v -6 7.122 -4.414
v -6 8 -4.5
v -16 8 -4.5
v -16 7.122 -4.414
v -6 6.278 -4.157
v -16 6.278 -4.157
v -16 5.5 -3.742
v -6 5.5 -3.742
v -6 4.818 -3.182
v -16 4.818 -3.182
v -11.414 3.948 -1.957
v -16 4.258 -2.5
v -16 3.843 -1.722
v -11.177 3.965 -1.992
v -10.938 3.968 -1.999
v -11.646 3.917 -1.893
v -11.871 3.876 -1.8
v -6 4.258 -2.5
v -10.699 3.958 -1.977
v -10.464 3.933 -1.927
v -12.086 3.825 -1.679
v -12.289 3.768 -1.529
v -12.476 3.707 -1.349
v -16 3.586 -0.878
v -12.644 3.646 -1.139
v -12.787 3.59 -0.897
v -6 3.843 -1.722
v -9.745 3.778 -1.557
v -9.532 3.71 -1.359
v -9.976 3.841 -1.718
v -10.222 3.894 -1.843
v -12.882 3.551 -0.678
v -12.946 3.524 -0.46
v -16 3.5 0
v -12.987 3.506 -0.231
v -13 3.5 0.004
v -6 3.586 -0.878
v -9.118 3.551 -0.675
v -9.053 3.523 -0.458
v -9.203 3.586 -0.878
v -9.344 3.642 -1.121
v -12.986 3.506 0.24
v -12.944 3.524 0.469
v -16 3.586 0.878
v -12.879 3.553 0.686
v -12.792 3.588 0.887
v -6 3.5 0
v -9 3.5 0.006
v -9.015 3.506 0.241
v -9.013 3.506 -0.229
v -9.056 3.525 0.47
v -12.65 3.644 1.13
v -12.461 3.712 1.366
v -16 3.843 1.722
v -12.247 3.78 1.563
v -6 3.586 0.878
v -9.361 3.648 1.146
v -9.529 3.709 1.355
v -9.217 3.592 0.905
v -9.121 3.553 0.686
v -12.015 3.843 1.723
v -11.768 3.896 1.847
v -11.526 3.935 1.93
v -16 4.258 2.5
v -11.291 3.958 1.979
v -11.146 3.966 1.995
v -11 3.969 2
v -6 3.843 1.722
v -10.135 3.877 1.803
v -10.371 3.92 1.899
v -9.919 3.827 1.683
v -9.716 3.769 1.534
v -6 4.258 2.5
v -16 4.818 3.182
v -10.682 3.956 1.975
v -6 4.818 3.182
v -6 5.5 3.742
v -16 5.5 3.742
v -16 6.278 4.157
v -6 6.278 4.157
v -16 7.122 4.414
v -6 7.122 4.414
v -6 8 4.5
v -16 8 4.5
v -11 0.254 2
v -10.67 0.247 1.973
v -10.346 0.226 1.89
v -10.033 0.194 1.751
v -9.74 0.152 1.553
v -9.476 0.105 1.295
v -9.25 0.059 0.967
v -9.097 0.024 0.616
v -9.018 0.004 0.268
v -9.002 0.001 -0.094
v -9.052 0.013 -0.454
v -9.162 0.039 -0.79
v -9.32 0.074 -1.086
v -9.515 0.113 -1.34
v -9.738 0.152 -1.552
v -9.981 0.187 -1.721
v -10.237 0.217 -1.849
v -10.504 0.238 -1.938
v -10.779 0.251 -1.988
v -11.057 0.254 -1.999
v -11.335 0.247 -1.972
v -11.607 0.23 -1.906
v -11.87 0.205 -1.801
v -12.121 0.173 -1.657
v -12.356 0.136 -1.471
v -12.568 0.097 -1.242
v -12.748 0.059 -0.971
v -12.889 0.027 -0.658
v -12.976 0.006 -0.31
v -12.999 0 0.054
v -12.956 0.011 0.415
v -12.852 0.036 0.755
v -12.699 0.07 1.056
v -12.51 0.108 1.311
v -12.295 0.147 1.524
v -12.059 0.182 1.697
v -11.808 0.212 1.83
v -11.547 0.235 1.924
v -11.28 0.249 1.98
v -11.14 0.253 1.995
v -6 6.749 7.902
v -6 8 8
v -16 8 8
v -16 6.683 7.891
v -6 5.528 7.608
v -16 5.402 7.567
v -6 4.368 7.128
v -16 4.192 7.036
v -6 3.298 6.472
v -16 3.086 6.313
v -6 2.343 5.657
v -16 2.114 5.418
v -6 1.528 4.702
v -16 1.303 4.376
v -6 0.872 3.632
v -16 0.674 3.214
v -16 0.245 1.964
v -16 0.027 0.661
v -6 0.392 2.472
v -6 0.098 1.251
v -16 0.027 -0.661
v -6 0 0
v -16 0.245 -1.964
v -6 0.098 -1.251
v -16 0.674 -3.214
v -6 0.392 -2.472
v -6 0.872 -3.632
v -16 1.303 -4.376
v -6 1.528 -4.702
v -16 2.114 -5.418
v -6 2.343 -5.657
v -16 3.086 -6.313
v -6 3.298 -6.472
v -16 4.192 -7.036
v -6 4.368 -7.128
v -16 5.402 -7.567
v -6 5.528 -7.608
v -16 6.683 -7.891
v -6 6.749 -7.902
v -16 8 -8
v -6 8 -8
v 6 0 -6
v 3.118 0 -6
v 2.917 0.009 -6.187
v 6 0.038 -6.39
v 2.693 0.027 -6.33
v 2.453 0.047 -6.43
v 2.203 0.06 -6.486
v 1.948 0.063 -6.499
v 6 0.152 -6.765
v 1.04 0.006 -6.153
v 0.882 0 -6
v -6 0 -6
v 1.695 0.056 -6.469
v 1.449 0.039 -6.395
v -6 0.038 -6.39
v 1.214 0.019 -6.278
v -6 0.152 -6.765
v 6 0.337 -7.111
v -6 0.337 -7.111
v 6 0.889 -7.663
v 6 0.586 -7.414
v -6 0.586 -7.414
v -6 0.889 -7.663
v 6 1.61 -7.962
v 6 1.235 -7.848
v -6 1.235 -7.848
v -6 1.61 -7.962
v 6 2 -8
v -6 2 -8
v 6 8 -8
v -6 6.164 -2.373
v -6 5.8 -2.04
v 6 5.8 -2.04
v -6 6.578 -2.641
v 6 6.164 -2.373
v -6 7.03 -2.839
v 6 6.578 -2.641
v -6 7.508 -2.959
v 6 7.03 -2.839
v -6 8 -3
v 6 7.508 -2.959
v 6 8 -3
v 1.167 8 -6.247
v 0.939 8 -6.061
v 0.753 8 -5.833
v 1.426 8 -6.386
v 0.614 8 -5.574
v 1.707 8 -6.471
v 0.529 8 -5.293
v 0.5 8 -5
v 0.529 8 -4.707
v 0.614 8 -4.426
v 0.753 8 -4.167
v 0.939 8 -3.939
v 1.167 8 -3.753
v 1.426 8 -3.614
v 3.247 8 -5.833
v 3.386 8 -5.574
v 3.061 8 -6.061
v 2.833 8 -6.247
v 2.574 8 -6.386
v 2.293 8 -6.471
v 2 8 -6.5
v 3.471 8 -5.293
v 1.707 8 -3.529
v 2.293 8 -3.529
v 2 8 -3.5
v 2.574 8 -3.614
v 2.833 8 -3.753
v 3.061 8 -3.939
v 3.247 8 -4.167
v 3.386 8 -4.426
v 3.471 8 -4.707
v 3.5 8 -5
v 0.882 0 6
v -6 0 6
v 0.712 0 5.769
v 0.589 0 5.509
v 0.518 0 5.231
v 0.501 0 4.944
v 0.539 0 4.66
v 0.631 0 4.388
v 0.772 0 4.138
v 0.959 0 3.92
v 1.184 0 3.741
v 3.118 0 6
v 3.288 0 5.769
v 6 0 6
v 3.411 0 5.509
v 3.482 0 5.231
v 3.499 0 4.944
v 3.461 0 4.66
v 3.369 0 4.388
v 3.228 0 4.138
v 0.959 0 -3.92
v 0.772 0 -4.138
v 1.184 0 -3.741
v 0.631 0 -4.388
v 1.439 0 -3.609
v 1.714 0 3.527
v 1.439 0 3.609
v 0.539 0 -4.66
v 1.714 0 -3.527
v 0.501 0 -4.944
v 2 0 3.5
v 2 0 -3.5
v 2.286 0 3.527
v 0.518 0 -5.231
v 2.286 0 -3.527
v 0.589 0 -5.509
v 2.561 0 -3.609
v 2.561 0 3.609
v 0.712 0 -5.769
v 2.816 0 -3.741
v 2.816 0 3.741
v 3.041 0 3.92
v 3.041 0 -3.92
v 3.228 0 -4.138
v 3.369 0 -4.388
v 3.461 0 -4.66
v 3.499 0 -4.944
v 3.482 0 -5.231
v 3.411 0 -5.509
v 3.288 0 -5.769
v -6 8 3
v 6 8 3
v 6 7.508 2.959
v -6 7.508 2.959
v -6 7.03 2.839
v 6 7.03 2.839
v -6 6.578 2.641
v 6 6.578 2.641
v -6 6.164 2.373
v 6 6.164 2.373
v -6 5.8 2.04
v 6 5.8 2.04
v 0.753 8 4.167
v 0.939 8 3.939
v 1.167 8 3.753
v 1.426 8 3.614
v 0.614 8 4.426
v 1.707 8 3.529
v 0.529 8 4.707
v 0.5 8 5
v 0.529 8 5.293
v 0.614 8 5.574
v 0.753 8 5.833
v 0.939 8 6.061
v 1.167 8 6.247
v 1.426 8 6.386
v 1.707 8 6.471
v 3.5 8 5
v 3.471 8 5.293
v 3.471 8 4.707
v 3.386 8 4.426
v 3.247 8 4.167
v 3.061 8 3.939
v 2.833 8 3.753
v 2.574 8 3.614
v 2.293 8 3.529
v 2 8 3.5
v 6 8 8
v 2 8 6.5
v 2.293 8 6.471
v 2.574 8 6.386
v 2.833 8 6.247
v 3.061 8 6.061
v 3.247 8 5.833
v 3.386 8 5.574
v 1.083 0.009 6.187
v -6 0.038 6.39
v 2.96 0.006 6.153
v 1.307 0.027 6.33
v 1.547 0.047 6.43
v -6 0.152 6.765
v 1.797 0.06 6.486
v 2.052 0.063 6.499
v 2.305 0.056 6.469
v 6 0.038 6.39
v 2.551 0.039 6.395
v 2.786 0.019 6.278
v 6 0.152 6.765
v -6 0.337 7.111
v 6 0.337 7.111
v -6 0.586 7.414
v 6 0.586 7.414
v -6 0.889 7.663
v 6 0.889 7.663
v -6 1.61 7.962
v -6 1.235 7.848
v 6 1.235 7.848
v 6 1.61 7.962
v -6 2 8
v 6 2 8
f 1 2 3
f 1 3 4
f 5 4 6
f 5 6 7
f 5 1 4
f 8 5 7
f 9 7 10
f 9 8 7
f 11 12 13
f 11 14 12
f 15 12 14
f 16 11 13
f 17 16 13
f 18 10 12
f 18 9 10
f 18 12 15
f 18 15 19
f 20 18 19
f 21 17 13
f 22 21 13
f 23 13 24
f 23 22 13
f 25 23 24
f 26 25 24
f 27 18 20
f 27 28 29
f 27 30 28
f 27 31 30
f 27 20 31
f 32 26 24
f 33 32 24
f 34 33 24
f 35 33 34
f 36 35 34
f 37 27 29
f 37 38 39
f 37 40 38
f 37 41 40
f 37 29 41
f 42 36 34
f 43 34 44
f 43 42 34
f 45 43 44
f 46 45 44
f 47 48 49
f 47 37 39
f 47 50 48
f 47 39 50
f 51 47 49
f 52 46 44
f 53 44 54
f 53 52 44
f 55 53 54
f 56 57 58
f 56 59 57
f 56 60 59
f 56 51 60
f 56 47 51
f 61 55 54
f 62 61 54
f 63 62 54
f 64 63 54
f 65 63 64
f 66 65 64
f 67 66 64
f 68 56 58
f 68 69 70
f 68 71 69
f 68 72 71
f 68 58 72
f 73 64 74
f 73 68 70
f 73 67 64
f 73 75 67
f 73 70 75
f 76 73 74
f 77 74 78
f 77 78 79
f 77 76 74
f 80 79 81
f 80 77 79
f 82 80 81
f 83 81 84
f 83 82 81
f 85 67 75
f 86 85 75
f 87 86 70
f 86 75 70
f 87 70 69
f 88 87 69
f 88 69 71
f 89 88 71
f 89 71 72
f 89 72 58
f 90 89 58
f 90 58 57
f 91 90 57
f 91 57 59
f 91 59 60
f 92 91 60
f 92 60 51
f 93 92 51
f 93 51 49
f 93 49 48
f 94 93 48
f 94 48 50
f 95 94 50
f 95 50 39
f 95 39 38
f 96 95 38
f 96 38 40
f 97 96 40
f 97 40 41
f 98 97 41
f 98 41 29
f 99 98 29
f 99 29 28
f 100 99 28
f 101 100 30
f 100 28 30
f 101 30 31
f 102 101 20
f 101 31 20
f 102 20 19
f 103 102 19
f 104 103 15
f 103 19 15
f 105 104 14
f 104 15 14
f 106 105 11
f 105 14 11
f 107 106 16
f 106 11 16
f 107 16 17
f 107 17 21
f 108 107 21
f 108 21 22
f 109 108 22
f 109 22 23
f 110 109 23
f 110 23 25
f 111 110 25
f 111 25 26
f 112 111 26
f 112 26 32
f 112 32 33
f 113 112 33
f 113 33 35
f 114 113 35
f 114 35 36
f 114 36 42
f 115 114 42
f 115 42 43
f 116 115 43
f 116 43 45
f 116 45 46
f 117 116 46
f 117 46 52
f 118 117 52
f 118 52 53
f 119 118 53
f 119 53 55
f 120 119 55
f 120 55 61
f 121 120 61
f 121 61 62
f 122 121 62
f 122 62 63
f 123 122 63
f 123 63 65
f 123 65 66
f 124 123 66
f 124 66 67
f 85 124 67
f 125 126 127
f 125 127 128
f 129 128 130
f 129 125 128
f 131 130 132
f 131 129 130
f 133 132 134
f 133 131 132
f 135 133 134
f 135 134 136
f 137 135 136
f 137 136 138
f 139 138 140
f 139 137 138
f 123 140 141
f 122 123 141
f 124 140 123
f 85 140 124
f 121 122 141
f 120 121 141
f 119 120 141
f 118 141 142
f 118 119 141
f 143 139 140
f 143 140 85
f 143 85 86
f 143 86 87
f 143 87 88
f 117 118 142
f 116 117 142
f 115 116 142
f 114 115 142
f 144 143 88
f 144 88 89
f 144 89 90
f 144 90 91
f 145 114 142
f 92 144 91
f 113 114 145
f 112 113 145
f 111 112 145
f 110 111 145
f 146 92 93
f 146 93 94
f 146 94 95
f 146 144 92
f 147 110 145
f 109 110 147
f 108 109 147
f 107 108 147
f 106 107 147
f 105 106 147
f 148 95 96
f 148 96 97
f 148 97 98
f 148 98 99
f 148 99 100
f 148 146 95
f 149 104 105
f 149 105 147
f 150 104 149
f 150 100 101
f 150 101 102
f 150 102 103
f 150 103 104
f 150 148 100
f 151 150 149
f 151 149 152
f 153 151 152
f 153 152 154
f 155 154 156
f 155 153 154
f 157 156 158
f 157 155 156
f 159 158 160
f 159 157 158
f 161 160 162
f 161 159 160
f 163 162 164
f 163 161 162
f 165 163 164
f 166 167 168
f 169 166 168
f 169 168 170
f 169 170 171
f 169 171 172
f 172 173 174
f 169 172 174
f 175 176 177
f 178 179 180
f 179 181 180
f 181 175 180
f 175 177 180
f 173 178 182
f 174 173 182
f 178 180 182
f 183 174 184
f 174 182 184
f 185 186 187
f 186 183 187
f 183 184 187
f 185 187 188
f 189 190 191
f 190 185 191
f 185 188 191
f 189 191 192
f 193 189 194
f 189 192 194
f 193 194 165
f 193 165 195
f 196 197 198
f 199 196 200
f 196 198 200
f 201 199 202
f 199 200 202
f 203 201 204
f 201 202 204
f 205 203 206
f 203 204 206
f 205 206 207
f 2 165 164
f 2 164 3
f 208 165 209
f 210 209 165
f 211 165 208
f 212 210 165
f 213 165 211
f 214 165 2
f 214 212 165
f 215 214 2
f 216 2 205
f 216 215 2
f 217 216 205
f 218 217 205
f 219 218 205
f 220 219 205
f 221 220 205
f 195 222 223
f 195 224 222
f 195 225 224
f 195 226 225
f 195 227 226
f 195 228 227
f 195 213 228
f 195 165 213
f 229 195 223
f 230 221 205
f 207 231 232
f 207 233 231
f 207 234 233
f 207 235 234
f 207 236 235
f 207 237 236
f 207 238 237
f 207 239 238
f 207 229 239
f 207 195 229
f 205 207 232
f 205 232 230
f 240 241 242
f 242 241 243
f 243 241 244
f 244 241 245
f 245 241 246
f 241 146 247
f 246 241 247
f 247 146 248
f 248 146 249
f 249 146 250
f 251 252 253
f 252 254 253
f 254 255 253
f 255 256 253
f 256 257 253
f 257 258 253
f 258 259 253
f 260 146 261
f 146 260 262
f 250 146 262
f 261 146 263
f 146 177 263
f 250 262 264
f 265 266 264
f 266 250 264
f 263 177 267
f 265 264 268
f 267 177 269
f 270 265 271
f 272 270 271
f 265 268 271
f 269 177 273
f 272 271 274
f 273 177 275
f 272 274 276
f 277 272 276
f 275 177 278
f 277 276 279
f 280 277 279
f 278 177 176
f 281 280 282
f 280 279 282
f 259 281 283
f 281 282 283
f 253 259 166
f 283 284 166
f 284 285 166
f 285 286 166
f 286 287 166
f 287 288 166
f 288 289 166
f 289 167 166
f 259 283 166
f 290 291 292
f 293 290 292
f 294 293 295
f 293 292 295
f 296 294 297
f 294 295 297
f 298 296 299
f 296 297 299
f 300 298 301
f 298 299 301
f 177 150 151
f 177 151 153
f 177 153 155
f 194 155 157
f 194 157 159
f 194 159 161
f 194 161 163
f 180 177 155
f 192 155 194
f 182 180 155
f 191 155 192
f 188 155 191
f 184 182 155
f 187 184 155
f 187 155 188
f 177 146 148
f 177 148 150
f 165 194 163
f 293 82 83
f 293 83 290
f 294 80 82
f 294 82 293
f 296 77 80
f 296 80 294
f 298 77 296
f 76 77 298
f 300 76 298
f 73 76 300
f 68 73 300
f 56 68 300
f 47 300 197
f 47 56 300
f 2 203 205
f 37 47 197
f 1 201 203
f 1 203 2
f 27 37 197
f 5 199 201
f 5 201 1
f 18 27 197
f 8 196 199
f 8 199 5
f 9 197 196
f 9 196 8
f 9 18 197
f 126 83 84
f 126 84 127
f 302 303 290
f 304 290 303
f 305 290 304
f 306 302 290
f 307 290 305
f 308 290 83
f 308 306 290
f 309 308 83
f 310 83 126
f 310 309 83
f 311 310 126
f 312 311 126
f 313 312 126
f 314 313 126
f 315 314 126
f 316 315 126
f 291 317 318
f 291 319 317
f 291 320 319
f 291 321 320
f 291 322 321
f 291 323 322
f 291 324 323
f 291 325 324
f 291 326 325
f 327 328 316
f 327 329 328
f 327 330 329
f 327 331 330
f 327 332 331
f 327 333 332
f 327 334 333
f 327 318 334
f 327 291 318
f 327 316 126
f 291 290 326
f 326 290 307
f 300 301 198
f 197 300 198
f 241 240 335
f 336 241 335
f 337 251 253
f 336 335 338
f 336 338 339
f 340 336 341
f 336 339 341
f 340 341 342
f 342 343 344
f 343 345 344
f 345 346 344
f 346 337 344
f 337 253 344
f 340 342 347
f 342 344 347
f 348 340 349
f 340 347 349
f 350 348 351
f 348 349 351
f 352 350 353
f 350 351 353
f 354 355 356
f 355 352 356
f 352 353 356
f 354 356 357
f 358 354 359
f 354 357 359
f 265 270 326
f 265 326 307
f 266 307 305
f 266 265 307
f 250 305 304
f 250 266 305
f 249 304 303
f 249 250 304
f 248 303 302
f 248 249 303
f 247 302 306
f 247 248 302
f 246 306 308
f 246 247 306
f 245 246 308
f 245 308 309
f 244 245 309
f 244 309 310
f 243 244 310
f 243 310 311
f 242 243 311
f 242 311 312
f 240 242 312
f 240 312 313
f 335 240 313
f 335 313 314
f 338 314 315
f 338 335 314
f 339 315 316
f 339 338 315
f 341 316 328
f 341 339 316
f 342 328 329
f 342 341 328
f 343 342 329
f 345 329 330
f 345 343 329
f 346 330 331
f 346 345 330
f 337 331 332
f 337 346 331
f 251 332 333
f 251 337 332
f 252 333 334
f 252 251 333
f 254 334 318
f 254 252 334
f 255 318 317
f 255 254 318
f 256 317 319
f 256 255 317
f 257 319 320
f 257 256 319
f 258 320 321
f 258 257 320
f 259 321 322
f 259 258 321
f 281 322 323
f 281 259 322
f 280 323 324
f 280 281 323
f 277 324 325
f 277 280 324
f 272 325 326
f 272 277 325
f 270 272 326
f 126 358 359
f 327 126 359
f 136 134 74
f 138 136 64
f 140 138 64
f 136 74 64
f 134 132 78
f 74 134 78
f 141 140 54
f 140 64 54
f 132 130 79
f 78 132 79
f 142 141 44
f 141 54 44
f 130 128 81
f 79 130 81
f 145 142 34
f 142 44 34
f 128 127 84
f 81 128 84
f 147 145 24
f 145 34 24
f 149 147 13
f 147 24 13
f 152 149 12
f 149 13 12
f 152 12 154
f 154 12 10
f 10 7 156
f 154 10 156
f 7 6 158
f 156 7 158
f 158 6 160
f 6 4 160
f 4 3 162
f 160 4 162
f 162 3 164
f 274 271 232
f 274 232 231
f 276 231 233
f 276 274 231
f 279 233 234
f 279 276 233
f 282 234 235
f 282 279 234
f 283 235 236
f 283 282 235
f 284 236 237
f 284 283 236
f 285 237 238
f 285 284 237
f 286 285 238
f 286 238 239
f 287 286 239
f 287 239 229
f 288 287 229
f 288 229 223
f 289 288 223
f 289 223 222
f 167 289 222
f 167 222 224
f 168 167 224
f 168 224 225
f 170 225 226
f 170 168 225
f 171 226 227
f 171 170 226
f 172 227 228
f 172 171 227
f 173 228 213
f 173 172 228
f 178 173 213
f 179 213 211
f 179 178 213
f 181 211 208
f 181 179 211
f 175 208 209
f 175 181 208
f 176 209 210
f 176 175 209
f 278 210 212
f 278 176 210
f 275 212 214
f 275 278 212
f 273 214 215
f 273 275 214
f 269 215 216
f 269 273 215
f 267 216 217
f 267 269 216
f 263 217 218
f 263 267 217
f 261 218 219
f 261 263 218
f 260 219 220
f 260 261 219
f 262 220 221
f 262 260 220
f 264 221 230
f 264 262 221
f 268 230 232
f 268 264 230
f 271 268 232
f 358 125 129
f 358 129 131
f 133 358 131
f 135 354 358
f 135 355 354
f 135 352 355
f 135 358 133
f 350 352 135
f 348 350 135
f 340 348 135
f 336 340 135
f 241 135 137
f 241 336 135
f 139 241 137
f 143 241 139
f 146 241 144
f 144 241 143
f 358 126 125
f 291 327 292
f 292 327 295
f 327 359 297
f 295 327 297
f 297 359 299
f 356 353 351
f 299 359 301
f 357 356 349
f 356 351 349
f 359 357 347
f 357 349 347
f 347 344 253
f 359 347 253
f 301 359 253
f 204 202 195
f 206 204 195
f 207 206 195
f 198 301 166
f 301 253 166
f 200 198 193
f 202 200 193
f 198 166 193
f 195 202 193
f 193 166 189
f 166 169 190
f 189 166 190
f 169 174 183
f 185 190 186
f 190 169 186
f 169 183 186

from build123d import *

# Parameters (mm, degrees)
SKETCH_1_W          = 12
SKETCH_1_H          = 16
SKETCH_1_R          = 1.5
EXTRUDE_1_DEPTH     = 8
CUT_EXTRUDE_1_DEPTH = 25
EXTRUDE_2_DEPTH     = 10
FILLET_1_R          = 2
SKETCH_4_R          = 2
CUT_EXTRUDE_2_DEPTH = 20


with BuildPart() as part:
    # 草图1 → 凸台-拉伸1 (new body)
    with BuildSketch(Plane(origin=(0, 0, 0), x_dir=(1, 0, 0), z_dir=(0, 1, 0))):
        Rectangle(SKETCH_1_W, SKETCH_1_H)
        with Locations(Location((2, 5, 0), (0, 0, 270))):
            Circle(SKETCH_1_R, mode=Mode.SUBTRACT)
        with Locations(Location((2, -5, 0), (0, 0, 90))):
            Circle(SKETCH_1_R, mode=Mode.SUBTRACT)
    extrude(amount=EXTRUDE_1_DEPTH)

    # 草图2 → 切除-拉伸1 (cut)
    with BuildSketch(Plane(origin=(6, 0, 0), x_dir=(0, 0, -1), z_dir=(1, 0, 0))):
        with BuildLine():
            Line((-2.039607805, 5.8), (2.039607805, 5.8))
            ThreePointArc((2.039607805, 5.8), (0, 11), (-2.039607805, 5.8))
        make_face()
    extrude(amount=-CUT_EXTRUDE_1_DEPTH, mode=Mode.SUBTRACT)

    # 草图3 → 凸台-拉伸2 (add)
    with BuildSketch(Plane.ZY.offset(6)):
        with BuildLine():
            Line((-8, 8), (-4.5, 8))
            ThreePointArc((-4.5, 8), (0, 3.5), (4.5, 8))
            Line((4.5, 8), (8, 8))
            ThreePointArc((8, 8), (0, 0), (-8, 8))
        make_face()
    extrude(amount=EXTRUDE_2_DEPTH)

    # 圆角1
    # the kernel refuses this fillet: 2 mm, written as the material it takes off along each edge
    with BuildSketch(Plane(origin=(11, 0, 8), x_dir=(0, 0, -1), z_dir=(-1, 0, 0))) as fillet_1_piece_1:
        with BuildLine():
            CenterArc((FILLET_1_R, -FILLET_1_R), FILLET_1_R, 90, 90)
            Line((0, -FILLET_1_R), (0, 0))
            Line((0, 0), (FILLET_1_R, 0))
        make_face()
    extrude(amount=22, mode=Mode.SUBTRACT)
    with BuildSketch(Plane(origin=(-11, 0, -8), x_dir=(0, 1, 0), z_dir=(1, 0, 0))) as fillet_1_piece_2:
        with BuildLine():
            CenterArc((FILLET_1_R, FILLET_1_R), FILLET_1_R, 180, 90)
            Line((0, FILLET_1_R), (0, 0))
            Line((0, 0), (FILLET_1_R, 0))
        make_face()
    extrude(amount=22, mode=Mode.SUBTRACT)

    # 草图4 → 切除-拉伸2 (cut)
    with BuildSketch(Plane(origin=(0, 8, 0), x_dir=(1, 0, 0), z_dir=(0, 1, 0))):
        with Locations(Location((-11, 0, 0), (0, 0, 270))):
            Circle(SKETCH_4_R)
    extrude(amount=-CUT_EXTRUDE_2_DEPTH, mode=Mode.SUBTRACT)


solid = part.part
